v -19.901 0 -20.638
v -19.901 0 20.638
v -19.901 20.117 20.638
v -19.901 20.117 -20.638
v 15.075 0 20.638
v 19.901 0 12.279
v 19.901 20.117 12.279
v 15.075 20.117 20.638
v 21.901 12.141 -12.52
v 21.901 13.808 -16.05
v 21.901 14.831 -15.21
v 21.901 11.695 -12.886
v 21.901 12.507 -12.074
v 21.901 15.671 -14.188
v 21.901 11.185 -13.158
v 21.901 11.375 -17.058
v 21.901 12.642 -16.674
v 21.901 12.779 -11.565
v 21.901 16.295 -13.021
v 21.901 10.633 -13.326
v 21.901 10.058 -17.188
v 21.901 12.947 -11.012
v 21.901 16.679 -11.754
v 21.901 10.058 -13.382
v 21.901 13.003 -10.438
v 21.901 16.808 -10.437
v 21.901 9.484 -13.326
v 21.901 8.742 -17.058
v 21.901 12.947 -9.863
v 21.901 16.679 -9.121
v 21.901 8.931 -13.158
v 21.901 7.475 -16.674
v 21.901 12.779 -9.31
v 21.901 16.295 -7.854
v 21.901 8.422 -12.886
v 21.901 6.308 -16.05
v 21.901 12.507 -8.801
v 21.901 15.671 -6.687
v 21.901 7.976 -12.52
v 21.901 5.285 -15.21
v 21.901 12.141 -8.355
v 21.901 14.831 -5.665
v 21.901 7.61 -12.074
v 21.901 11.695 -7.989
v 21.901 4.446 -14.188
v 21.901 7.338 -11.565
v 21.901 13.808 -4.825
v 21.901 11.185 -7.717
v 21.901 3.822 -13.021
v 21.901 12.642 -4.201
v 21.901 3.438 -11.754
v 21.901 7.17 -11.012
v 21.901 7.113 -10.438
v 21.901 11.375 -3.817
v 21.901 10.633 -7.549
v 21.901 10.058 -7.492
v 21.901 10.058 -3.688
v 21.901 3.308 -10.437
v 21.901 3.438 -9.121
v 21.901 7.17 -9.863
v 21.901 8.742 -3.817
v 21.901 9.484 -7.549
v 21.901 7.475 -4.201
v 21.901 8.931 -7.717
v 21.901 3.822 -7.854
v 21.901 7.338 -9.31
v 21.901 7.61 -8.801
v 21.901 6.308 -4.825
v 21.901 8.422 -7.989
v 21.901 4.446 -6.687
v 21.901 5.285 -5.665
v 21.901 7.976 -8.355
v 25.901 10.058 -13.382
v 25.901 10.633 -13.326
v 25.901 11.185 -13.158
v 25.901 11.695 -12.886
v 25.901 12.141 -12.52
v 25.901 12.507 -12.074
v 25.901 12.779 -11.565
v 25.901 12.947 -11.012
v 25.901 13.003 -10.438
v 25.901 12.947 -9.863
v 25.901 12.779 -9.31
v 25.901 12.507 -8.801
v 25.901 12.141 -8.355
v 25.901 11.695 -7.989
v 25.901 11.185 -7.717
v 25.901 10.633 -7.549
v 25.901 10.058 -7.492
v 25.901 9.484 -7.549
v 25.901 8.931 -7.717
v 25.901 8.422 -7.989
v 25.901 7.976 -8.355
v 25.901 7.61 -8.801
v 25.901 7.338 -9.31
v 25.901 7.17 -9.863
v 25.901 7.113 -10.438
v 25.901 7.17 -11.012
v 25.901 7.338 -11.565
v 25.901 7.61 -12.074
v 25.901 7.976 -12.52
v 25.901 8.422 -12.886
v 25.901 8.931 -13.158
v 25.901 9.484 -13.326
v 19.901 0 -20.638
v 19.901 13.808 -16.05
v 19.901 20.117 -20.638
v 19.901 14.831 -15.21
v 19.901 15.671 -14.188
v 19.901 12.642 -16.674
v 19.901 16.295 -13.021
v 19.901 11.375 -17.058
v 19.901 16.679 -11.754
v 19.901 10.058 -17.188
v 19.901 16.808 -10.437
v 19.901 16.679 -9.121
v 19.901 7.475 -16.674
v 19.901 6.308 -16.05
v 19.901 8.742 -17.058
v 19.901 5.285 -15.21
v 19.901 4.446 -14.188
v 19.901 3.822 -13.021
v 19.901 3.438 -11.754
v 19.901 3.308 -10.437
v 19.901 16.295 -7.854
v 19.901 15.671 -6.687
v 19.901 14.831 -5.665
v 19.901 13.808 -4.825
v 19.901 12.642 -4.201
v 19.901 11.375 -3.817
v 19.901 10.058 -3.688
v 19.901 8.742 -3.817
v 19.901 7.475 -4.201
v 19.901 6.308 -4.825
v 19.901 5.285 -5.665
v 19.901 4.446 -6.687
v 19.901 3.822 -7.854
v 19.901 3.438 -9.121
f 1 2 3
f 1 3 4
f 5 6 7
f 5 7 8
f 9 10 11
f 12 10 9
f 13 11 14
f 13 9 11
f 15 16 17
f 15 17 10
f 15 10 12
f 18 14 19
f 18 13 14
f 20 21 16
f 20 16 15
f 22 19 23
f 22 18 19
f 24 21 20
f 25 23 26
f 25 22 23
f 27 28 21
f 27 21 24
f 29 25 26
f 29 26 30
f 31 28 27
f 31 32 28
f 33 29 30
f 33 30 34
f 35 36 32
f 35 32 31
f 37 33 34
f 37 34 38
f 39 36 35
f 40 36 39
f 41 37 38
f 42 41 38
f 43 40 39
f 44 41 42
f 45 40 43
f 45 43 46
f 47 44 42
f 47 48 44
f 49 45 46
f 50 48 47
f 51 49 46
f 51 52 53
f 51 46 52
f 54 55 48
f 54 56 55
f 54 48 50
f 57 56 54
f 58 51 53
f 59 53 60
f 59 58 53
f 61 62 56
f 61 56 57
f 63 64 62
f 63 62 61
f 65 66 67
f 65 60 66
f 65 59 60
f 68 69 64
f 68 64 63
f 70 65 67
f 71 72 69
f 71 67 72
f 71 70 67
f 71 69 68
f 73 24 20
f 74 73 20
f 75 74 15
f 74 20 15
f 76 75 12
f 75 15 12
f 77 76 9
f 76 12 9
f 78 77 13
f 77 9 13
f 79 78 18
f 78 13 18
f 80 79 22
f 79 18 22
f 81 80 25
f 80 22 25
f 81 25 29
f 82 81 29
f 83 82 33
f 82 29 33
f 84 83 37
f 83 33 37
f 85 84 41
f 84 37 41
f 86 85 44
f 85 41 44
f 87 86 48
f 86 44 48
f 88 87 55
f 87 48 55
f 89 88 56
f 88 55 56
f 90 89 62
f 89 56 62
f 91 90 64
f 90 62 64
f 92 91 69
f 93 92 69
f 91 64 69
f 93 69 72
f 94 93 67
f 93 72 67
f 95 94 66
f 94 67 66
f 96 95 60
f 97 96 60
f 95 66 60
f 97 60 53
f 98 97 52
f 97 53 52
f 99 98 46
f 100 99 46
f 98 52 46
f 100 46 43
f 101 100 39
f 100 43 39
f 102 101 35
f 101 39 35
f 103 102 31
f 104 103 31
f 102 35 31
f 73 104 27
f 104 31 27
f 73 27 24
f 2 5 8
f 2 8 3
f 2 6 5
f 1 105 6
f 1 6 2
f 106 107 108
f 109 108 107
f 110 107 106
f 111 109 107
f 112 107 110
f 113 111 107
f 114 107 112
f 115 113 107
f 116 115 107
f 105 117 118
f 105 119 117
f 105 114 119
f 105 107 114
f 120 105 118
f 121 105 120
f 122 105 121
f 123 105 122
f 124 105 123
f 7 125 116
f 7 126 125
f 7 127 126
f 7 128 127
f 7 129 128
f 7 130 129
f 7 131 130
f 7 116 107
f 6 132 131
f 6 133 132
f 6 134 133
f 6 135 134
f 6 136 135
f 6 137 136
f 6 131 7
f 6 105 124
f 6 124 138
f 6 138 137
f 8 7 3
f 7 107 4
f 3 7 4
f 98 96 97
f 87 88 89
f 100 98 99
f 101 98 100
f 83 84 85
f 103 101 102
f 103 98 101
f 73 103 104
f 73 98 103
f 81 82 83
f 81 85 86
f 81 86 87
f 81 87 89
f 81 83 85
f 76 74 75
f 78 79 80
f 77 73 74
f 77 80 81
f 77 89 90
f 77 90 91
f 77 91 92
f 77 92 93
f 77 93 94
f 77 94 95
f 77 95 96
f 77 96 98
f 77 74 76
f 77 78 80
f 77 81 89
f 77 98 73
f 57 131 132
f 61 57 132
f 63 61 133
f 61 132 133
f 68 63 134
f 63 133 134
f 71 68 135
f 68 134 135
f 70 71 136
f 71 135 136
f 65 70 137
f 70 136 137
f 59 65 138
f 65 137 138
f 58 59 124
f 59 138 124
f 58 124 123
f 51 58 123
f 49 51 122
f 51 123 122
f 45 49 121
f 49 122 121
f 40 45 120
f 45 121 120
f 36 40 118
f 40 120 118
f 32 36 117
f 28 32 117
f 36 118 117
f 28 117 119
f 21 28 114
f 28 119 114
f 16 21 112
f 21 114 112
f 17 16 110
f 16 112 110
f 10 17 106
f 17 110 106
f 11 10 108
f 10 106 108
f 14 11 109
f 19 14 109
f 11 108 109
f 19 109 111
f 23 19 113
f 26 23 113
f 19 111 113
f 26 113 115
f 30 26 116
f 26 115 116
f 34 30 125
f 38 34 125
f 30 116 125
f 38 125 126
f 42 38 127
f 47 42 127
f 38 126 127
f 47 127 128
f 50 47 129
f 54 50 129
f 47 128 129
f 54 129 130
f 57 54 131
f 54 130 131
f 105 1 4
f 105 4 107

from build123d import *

# Parameters (mm, degrees)
BOSS_EXTRUDE1_DEPTH = 20.1168
SKETCH2_R           = 6.75
BOSS_EXTRUDE2_DEPTH = 2
SKETCH3_R           = 2.945
BOSS_EXTRUDE3_DEPTH = 4


with BuildPart() as part:
    # Sketch1 → Boss-Extrude1 (new body)
    with BuildSketch(Plane(origin=(0, 0, 0), x_dir=(1, 0, 0), z_dir=(0, 1, 0))):
        Polygon((19.9009, -12.278622803), (15.0749, -20.6375), (-19.9009, -20.6375), (-19.9009, 20.6375), (19.9009, 20.6375), align=None)
    extrude(amount=BOSS_EXTRUDE1_DEPTH)

    # Sketch2 → Boss-Extrude2 (add)
    with BuildSketch(Plane(origin=(19.9009, 0, 0), x_dir=(0, 0, -1), z_dir=(1, 0, 0))):
        with Locations(Location((10.4375, 10.0584, 0), (0, 0, 180))):
            Circle(SKETCH2_R)
    extrude(amount=BOSS_EXTRUDE2_DEPTH)

    # Sketch3 → Boss-Extrude3 (add)
    with BuildSketch(Plane(origin=(21.9009, 0, 0), x_dir=(0, 0, -1), z_dir=(1, 0, 0))):
        with Locations((10.4375, 10.0584)):
            Circle(SKETCH3_R)
    extrude(amount=BOSS_EXTRUDE3_DEPTH)


solid = part.part
